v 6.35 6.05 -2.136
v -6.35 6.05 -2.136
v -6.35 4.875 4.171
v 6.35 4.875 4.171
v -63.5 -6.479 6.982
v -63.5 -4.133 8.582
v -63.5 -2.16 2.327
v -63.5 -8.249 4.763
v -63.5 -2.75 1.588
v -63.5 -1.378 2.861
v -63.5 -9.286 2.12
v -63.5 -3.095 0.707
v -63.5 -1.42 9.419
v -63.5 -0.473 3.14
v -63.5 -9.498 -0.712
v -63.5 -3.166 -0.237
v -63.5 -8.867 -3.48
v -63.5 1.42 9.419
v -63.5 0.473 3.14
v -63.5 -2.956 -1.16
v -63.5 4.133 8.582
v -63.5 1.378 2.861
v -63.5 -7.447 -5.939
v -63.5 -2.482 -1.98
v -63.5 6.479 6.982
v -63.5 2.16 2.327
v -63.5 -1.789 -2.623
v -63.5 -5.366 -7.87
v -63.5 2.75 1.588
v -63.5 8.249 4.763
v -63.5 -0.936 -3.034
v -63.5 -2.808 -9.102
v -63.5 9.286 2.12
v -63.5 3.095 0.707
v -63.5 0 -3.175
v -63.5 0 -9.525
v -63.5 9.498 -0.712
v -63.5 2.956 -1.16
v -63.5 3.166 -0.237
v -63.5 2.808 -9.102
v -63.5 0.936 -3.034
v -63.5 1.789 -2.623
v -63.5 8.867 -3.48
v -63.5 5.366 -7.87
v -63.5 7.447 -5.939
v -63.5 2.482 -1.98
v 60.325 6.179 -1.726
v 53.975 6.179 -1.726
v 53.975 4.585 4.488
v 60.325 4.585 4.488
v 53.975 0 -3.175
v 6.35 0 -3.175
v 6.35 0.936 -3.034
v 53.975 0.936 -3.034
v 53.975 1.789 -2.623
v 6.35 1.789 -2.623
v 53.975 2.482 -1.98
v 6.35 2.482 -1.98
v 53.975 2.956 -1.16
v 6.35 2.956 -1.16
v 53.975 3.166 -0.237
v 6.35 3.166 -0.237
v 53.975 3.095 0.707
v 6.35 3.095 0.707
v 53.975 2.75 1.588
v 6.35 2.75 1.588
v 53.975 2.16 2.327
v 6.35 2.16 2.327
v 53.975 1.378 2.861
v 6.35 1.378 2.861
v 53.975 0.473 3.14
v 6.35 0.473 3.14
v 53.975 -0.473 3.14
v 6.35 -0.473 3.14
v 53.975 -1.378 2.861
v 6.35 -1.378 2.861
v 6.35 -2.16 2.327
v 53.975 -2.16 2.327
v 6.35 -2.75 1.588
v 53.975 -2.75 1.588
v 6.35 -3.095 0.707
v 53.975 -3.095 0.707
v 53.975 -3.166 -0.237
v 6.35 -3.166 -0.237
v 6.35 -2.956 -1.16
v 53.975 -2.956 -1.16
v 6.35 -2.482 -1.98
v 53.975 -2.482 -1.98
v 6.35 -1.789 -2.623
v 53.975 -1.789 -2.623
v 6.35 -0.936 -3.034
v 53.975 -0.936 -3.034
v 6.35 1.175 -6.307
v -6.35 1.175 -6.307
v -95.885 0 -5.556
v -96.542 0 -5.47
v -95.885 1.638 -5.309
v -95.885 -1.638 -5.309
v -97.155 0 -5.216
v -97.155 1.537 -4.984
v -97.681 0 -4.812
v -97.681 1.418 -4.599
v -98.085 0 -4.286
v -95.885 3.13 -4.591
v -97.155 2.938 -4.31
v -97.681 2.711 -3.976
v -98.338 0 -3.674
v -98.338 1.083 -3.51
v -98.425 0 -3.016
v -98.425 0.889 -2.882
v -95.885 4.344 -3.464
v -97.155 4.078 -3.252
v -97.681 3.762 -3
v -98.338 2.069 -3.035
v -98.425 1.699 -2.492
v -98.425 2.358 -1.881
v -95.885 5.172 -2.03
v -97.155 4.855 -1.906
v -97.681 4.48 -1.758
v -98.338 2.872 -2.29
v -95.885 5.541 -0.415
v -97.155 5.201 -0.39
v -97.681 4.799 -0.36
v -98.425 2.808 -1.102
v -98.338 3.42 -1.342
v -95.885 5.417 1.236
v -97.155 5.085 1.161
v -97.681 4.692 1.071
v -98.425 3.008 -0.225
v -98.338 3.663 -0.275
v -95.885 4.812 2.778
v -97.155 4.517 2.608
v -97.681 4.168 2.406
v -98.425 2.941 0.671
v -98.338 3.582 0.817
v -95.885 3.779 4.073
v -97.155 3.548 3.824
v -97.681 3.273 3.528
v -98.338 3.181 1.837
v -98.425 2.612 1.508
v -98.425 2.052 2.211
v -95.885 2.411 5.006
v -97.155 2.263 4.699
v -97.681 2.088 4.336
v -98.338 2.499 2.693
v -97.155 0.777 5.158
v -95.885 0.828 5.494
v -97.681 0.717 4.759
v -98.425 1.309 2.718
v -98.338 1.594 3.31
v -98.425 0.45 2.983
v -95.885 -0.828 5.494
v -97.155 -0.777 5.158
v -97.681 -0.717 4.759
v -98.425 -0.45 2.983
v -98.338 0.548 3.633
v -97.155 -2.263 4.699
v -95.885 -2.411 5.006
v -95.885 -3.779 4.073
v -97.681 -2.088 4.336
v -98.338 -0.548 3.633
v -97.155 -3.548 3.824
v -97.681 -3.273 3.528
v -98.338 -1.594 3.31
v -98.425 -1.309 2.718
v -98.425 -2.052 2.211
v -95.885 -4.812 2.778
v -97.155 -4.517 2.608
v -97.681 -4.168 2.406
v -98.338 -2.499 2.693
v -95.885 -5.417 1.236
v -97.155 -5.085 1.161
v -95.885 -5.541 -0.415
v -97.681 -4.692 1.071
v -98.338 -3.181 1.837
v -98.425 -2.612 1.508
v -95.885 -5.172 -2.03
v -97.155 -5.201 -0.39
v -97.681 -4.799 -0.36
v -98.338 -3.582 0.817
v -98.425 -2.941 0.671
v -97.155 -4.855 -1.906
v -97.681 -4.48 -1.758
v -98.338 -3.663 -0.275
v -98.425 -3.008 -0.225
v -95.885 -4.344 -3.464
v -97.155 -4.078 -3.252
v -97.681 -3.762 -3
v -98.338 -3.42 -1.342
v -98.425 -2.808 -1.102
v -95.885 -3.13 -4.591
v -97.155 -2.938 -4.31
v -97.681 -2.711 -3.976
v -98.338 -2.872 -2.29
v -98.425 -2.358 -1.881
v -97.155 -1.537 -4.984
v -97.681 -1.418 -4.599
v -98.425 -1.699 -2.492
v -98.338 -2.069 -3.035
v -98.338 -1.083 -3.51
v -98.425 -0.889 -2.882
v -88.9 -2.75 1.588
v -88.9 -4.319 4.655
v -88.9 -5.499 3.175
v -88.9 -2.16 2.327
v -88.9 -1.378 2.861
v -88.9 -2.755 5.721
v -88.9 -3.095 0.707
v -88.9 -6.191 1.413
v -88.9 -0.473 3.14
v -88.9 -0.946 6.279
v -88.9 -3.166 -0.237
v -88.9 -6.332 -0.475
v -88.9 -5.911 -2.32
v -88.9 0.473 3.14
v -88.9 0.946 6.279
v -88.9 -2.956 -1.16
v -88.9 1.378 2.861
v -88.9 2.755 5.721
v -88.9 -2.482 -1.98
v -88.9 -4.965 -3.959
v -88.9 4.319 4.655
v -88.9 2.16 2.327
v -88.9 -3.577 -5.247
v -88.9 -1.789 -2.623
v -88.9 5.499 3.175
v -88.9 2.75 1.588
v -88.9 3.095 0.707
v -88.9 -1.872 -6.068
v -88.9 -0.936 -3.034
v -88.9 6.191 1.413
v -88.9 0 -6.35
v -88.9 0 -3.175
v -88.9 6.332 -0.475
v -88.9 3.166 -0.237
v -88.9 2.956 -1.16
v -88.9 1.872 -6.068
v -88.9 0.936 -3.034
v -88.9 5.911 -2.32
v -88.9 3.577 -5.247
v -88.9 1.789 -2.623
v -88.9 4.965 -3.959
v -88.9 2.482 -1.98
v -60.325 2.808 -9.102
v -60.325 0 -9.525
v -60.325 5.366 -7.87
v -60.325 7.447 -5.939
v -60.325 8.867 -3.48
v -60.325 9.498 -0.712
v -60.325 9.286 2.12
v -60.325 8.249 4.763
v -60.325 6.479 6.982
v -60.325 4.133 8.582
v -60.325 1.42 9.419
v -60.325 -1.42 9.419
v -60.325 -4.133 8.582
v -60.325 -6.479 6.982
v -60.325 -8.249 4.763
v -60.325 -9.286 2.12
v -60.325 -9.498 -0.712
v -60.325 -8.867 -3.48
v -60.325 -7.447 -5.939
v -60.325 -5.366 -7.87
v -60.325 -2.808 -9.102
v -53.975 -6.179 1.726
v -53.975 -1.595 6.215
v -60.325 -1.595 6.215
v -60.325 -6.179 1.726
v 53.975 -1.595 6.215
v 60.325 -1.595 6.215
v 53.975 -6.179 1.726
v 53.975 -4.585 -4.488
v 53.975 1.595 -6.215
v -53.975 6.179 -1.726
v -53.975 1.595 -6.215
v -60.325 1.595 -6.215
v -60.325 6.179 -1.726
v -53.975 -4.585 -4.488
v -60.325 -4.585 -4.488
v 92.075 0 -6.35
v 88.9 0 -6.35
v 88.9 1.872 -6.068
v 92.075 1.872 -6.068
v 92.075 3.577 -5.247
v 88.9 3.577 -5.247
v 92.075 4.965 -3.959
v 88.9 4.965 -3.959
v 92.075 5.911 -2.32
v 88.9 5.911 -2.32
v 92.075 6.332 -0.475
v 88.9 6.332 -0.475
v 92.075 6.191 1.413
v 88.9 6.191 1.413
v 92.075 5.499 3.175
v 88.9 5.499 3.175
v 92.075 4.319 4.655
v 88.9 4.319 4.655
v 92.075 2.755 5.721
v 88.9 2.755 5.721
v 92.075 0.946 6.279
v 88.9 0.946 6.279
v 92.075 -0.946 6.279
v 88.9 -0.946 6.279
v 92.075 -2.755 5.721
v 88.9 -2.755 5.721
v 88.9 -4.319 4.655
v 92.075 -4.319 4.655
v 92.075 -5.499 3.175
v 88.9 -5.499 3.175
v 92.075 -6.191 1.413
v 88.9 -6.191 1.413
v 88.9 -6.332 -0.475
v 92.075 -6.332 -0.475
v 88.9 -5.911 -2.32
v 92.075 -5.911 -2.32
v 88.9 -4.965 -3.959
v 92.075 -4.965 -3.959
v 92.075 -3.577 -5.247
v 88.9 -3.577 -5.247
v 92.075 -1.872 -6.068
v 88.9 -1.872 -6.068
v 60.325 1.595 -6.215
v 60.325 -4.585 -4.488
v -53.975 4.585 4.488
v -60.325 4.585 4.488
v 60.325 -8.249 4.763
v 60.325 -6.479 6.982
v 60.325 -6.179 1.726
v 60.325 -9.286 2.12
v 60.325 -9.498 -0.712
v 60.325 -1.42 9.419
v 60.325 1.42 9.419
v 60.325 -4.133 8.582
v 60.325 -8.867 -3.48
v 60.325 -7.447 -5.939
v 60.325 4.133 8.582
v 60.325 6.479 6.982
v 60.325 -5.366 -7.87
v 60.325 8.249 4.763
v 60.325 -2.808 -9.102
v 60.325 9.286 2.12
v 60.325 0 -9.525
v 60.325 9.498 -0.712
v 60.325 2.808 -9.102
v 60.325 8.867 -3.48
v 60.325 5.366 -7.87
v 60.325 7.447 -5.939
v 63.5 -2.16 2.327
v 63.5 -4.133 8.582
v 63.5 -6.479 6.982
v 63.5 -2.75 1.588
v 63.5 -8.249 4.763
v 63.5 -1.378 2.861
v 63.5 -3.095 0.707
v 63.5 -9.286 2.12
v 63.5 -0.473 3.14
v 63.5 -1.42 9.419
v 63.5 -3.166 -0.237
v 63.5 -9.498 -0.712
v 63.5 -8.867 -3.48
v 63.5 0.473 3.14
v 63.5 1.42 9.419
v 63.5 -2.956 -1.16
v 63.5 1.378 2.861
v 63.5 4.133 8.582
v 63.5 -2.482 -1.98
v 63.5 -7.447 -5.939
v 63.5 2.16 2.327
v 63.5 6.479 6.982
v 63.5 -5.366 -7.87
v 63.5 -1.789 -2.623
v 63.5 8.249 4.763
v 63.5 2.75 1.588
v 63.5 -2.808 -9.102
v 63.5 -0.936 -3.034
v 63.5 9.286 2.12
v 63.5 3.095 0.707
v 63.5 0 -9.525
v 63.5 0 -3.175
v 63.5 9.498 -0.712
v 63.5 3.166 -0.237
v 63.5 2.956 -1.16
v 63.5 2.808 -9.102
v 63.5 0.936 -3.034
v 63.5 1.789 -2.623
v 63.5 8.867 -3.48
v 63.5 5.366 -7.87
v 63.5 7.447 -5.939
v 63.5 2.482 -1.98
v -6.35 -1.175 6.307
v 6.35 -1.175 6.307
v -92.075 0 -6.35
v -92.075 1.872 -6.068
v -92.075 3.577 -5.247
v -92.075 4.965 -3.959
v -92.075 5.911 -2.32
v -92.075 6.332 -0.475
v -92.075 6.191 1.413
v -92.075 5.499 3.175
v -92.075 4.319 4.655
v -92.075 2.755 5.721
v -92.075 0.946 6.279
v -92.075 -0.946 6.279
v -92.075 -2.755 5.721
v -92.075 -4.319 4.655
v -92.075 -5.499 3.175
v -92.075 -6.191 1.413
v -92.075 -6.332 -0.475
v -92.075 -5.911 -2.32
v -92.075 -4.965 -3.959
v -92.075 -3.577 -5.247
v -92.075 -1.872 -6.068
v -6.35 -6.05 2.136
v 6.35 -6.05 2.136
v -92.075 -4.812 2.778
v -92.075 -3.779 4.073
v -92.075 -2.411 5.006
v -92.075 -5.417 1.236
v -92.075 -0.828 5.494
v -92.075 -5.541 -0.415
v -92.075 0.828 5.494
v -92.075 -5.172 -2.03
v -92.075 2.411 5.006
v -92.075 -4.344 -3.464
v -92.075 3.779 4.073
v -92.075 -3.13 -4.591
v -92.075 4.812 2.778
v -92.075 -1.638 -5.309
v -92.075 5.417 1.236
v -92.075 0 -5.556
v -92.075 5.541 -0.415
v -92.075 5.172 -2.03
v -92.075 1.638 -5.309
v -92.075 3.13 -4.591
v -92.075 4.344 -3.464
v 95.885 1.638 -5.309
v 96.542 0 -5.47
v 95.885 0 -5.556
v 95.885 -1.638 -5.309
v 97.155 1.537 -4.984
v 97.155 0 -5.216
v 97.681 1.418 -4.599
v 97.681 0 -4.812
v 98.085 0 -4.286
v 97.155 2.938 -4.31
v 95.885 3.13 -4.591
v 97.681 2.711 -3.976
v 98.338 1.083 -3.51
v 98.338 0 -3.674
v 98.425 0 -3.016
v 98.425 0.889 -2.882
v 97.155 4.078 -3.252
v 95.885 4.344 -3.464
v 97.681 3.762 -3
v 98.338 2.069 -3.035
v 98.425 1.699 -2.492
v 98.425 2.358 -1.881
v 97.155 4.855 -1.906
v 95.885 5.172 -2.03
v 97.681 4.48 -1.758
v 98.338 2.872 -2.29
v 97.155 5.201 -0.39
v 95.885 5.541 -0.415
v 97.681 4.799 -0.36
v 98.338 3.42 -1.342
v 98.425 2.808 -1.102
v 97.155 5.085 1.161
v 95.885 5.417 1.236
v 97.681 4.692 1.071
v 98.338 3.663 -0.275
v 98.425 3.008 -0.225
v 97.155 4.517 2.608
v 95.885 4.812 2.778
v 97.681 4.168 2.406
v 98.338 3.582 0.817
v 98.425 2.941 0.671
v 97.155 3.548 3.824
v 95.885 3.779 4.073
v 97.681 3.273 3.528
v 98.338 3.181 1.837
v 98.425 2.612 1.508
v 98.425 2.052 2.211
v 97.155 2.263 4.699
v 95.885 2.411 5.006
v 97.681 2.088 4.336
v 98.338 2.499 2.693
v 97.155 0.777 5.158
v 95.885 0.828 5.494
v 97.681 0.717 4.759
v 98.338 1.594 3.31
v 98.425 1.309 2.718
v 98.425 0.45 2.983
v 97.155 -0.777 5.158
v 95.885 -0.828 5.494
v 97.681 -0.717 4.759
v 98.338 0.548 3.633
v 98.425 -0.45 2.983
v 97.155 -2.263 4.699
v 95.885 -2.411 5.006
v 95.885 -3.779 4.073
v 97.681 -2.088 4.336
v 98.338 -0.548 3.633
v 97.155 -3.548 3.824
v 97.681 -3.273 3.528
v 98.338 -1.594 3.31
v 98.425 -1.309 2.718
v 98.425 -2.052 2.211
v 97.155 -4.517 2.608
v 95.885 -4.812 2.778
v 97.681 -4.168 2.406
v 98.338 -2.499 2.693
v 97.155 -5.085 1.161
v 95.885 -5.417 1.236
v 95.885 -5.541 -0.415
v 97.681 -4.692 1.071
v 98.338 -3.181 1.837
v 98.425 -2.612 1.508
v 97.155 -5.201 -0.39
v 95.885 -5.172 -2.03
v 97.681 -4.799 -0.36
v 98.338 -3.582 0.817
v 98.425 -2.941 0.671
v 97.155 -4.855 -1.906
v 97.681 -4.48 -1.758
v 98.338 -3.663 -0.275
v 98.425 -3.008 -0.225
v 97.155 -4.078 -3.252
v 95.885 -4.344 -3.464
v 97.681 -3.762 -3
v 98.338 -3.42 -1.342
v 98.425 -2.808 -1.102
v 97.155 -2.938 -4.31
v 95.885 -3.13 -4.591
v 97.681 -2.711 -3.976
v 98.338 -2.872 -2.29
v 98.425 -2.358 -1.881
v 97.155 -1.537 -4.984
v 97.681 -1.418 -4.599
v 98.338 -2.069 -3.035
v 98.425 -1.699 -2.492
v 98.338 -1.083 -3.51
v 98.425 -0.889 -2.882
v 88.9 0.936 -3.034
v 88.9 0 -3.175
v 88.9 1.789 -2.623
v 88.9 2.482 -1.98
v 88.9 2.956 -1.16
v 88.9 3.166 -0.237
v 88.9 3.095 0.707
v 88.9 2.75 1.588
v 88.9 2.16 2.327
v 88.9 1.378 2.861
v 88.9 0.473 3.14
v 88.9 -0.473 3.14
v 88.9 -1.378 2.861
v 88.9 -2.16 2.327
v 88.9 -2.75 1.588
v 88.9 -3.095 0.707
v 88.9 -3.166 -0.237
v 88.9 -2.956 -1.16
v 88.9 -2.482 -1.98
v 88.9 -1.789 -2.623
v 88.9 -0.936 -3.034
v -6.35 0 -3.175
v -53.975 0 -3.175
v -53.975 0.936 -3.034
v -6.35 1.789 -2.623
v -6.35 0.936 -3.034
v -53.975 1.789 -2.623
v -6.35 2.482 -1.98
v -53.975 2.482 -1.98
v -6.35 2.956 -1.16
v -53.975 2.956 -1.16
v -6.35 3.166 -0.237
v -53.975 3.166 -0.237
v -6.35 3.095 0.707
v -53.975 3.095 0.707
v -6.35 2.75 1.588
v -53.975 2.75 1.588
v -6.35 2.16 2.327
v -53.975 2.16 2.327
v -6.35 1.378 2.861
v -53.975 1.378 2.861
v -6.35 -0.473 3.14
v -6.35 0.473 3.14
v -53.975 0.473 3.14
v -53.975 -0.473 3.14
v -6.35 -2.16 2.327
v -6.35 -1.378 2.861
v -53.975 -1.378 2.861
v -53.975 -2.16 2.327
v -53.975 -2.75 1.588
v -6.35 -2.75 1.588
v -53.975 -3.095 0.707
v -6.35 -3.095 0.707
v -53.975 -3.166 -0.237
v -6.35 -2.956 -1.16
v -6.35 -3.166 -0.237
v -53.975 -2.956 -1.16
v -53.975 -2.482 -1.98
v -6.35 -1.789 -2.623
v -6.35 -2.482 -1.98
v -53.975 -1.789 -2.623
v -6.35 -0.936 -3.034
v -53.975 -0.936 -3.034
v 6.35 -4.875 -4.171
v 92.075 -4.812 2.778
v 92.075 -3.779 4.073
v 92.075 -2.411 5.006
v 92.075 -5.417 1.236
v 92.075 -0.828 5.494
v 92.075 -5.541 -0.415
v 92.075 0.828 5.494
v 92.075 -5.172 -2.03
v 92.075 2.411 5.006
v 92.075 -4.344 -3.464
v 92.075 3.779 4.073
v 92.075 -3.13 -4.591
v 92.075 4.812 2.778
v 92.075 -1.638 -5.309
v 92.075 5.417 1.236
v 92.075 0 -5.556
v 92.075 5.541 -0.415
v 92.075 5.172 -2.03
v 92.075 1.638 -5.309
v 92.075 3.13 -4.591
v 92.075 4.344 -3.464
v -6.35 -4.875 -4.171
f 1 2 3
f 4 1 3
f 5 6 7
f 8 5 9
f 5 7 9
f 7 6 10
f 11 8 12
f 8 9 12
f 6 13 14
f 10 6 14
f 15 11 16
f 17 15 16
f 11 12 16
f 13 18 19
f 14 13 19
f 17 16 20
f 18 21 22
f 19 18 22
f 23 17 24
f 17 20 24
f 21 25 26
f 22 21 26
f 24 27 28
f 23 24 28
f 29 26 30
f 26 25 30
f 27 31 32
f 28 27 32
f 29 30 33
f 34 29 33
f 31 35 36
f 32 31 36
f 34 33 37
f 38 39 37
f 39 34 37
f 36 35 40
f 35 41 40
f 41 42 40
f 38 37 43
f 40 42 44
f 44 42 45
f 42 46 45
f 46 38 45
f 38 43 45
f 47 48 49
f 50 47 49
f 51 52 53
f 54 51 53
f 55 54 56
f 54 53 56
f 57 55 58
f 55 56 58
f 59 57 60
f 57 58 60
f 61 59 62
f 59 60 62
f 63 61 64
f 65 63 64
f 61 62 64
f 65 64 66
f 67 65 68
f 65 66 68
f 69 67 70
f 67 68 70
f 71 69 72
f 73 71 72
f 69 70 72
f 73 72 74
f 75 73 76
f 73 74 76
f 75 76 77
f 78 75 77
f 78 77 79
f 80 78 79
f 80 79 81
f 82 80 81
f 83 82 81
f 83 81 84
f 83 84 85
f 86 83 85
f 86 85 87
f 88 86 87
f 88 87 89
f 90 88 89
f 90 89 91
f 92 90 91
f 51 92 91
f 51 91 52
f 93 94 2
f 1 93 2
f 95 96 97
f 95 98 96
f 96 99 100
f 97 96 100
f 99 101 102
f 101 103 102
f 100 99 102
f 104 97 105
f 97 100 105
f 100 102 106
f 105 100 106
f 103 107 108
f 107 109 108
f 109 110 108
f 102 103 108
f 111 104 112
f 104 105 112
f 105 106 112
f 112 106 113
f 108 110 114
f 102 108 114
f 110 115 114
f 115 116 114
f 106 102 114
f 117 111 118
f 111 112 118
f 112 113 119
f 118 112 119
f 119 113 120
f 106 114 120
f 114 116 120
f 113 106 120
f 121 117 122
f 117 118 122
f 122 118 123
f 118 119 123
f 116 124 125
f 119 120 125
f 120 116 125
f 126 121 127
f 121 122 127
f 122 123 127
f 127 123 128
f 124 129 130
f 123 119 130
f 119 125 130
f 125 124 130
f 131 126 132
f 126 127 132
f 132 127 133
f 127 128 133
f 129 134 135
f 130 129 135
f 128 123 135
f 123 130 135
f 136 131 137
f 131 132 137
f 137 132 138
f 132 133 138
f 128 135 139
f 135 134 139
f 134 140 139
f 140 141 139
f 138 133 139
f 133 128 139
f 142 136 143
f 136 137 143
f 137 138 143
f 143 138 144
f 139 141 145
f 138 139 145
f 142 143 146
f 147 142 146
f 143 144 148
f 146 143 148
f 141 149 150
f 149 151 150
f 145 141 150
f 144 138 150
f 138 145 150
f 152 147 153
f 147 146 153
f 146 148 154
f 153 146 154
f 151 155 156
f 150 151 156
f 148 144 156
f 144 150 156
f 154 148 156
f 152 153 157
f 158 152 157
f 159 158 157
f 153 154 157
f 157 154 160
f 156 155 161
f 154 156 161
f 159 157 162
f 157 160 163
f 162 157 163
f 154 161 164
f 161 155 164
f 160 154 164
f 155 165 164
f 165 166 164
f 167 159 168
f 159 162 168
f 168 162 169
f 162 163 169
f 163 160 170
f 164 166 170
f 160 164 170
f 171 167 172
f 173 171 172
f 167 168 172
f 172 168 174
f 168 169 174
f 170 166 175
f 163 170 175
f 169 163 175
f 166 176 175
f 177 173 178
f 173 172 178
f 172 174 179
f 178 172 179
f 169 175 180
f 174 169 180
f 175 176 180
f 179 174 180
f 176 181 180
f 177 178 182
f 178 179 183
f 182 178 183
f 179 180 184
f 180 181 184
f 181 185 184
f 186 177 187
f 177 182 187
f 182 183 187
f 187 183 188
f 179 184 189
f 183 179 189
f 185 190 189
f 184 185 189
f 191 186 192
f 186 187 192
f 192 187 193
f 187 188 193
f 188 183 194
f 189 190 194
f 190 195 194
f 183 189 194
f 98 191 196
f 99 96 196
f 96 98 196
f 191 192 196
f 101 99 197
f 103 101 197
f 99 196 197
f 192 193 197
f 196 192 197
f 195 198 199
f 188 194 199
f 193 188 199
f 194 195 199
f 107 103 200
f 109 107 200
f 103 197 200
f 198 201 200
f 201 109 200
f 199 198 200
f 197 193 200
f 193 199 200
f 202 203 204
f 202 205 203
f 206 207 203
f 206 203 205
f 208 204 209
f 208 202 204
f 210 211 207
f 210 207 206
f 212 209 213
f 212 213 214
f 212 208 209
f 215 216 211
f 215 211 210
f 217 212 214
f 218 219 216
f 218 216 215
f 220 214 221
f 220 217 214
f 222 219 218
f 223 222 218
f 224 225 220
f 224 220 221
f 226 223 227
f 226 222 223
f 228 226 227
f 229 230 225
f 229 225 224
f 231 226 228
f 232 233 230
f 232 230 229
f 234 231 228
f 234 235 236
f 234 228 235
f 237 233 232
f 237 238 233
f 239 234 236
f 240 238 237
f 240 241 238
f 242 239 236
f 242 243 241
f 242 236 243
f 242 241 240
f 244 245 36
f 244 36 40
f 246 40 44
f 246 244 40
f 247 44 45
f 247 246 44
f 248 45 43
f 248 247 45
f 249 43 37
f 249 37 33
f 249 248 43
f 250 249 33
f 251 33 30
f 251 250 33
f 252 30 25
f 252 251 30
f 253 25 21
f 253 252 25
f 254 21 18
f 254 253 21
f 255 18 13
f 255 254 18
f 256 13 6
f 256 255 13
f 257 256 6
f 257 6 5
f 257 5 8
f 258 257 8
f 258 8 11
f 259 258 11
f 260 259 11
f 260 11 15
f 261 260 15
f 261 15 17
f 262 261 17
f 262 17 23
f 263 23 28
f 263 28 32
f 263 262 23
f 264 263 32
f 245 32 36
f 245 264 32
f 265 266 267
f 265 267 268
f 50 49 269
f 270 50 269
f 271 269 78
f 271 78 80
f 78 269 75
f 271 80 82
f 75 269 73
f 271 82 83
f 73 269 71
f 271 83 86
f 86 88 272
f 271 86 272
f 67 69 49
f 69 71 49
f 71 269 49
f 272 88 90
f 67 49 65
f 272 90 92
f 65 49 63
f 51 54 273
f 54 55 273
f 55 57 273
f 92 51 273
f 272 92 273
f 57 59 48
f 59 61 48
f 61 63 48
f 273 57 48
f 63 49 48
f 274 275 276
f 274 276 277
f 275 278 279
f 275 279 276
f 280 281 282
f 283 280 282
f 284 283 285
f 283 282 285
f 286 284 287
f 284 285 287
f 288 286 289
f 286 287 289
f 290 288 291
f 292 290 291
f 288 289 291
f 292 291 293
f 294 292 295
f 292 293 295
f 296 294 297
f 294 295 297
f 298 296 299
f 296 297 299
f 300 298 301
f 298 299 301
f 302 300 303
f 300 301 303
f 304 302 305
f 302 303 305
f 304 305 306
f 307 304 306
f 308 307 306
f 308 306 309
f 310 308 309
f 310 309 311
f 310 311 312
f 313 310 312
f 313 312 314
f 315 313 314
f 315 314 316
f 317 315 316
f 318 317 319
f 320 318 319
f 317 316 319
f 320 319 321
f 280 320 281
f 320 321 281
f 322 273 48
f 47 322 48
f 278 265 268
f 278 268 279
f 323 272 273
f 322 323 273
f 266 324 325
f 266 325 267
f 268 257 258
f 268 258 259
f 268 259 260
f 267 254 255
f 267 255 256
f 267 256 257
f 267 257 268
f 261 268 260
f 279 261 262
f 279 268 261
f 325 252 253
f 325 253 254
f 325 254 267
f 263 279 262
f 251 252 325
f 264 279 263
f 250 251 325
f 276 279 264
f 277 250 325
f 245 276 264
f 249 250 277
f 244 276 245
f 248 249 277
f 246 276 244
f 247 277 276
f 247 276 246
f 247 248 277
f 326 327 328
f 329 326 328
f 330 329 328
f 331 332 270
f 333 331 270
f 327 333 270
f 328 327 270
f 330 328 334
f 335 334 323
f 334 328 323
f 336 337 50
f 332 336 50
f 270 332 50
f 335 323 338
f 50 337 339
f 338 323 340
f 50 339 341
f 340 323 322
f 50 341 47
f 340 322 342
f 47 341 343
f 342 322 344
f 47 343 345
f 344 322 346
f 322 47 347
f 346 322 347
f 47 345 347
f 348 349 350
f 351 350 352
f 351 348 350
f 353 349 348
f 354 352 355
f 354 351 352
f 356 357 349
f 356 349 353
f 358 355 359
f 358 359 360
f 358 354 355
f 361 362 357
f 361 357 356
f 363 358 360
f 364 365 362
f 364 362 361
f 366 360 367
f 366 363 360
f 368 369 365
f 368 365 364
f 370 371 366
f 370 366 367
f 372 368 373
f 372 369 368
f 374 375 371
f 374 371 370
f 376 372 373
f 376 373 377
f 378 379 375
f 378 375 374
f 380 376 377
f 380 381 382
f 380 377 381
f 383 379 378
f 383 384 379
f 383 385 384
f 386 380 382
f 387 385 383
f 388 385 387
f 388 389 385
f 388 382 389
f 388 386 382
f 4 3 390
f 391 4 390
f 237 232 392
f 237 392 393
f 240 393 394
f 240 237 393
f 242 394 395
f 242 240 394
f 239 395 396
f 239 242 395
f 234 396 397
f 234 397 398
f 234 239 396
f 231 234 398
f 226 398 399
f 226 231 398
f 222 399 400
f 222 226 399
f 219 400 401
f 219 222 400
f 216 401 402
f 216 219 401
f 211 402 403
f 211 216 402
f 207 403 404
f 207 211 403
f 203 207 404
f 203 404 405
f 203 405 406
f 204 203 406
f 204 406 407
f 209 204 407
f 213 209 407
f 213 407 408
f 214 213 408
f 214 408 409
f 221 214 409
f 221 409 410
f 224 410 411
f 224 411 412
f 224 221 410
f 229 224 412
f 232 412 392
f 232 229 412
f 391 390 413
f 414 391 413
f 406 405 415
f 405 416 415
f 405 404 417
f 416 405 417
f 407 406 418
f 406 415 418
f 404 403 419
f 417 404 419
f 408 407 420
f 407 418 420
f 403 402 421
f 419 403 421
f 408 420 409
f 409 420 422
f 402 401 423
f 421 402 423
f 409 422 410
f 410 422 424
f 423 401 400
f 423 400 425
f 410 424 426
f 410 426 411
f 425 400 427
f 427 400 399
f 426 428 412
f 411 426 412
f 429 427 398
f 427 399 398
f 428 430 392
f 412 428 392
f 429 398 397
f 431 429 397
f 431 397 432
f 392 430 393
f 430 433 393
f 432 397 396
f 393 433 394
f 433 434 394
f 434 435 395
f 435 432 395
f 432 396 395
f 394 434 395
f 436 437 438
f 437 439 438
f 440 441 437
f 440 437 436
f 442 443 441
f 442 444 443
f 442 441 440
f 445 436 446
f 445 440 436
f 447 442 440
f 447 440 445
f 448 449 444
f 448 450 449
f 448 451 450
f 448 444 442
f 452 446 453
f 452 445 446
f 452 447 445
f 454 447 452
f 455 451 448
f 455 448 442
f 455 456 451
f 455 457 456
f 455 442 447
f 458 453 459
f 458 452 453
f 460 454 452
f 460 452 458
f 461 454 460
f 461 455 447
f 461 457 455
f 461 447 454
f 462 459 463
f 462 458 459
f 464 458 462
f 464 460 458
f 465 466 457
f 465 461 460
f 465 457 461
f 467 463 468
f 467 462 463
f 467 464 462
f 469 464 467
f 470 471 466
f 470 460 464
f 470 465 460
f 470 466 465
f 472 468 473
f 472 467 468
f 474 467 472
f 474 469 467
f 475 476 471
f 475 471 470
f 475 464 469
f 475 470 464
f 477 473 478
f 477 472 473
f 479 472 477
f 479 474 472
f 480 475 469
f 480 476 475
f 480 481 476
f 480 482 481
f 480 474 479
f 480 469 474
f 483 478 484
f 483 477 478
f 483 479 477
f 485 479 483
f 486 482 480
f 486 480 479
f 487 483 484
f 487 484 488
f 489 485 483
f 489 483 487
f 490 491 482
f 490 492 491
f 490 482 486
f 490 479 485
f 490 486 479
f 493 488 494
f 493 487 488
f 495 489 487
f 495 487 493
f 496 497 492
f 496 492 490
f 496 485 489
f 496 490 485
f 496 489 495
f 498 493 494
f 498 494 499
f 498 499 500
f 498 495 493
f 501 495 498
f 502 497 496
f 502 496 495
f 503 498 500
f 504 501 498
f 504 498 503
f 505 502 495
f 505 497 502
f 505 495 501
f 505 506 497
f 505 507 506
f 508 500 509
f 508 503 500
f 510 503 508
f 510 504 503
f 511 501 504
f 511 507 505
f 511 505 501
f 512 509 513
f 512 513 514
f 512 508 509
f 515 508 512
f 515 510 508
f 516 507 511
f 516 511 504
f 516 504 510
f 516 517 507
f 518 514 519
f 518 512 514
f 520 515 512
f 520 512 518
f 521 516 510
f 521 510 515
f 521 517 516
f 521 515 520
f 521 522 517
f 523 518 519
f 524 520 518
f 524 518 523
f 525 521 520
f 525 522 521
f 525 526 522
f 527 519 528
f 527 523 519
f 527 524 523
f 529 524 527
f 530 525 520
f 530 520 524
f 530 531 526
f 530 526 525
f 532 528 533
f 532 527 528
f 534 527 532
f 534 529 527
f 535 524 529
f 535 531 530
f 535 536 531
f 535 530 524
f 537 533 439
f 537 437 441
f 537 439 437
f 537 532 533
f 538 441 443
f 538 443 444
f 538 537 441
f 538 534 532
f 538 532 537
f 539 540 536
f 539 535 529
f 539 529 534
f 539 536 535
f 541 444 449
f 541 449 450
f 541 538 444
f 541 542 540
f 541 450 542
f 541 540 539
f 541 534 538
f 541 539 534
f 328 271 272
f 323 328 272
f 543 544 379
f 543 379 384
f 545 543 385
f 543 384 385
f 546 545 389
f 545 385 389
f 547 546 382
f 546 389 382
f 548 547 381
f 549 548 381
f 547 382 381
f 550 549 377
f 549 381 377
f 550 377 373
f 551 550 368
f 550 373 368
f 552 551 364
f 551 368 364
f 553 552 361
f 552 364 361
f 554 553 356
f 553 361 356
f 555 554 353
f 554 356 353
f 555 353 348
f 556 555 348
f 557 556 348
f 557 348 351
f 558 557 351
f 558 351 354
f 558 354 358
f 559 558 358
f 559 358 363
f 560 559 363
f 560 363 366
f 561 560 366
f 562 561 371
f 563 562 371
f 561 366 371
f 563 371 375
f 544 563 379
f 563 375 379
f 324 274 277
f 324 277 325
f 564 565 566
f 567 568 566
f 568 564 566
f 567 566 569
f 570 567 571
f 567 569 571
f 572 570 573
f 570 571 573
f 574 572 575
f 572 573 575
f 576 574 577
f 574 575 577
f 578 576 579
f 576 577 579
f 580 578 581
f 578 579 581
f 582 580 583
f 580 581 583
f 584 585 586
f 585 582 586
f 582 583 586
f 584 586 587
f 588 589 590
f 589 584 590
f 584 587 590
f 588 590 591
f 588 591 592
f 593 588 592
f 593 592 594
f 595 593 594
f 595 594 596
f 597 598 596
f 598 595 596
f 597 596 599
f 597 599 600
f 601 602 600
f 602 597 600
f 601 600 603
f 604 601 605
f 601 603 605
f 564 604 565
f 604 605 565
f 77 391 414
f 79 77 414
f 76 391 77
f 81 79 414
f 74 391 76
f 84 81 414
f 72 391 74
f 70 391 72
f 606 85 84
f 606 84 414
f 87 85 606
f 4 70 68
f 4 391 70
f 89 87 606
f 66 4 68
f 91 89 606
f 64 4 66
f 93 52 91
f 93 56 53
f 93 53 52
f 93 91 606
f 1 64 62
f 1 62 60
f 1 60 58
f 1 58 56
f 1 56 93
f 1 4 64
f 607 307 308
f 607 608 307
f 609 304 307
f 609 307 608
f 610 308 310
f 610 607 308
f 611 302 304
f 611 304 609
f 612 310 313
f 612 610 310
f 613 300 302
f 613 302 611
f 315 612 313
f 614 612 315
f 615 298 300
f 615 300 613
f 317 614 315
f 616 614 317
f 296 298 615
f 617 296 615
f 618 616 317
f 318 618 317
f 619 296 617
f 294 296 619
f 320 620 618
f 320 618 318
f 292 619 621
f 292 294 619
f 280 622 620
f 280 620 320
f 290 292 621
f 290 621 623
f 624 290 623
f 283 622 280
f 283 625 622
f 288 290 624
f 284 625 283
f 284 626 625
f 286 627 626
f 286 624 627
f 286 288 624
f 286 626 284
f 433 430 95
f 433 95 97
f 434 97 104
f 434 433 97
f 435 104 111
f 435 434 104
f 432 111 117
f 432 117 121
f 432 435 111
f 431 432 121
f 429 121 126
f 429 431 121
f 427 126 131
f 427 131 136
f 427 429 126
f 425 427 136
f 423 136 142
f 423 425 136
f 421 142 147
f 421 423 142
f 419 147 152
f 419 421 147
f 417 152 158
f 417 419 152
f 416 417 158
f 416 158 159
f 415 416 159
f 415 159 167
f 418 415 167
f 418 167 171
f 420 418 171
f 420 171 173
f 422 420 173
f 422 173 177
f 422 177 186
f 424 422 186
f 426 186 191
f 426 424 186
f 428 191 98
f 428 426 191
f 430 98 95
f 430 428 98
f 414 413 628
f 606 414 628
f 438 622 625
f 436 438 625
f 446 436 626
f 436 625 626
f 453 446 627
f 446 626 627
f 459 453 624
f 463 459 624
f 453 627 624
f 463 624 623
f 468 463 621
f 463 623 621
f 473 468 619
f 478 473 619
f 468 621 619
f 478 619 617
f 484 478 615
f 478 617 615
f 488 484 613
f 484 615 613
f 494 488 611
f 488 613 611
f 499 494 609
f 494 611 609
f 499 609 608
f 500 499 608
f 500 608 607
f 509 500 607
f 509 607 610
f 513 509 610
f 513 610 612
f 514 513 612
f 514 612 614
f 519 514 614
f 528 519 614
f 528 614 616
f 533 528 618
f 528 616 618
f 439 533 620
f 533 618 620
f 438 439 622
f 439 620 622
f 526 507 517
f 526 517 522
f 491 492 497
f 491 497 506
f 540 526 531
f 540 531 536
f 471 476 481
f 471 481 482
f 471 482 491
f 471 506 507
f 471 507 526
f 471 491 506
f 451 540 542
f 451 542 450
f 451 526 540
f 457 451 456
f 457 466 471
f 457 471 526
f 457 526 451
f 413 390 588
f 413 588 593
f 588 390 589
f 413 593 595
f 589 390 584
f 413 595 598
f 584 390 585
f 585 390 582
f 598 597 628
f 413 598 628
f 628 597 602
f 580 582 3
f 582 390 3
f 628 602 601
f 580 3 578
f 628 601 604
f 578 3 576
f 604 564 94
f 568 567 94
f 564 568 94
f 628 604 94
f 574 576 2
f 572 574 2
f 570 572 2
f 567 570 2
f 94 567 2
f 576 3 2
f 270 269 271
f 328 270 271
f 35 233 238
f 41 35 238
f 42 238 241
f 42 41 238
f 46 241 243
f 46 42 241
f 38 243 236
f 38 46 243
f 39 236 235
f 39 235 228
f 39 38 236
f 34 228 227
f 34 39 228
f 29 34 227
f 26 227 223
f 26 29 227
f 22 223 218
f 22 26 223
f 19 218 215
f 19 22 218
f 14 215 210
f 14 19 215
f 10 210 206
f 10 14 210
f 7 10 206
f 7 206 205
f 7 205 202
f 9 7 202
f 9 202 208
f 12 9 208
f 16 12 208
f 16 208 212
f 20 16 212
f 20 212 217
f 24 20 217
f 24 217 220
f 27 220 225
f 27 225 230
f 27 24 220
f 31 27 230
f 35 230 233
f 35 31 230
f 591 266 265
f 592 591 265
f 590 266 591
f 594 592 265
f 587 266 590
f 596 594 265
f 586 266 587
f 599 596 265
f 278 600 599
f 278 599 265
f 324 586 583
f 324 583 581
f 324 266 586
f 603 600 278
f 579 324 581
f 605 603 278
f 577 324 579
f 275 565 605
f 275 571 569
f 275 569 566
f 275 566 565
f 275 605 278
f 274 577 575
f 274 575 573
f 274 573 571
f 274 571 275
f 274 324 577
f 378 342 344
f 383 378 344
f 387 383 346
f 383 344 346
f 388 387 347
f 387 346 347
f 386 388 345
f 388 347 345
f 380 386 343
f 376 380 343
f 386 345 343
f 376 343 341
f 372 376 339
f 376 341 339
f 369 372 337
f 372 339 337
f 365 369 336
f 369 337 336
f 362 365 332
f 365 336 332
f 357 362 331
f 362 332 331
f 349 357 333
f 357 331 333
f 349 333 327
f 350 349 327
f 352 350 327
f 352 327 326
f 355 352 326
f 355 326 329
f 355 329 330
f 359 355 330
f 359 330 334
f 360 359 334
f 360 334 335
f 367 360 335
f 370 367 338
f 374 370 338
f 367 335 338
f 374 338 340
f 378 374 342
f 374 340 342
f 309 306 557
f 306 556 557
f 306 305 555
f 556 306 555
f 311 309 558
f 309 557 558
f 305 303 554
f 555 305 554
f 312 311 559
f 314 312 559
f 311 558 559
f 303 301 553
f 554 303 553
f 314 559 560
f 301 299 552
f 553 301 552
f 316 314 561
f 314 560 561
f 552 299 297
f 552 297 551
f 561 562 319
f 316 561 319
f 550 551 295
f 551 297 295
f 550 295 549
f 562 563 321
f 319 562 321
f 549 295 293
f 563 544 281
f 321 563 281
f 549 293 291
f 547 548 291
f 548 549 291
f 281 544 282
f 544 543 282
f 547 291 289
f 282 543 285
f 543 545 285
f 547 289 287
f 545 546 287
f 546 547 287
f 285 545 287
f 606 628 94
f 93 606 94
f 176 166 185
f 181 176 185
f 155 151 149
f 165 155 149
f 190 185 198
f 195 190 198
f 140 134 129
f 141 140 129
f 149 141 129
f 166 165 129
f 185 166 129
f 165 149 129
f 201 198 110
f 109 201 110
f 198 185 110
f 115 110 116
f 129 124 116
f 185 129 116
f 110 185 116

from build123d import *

# Parameters (mm, degrees)
BOSS_EXTRUDE1_DEPTH      = 6.35
BOSS_EXTRUDE1_DEPTH_BACK = 6.35
BOSS_EXTRUDE2_DEPTH      = 47.625
BOSS_EXTRUDE2_DEPTH_BACK = 66.675
SKETCH3_R                = 3.175
BOSS_EXTRUDE3_DEPTH      = 6.35
SKETCH5_R                = 9.525
BOSS_EXTRUDE4_DEPTH      = 3.175
SKETCH7_R                = 3.175
BOSS_EXTRUDE5_DEPTH      = 25.4
SKETCH8_R                = 6.35
BOSS_EXTRUDE6_DEPTH      = 3.175
SKETCH9_R                = 5.55625
BOSS_EXTRUDE7_DEPTH      = 6.35
FILLET1_R                = 2.54
FILLET1_OF_MIRROR2_R     = 2.54


with BuildPart() as part:
    # Sketch2 → Boss-Extrude1 (new, two sides: drawn at the far end of the back side and taken through both)
    with BuildSketch(Plane(origin=(0, 0, 0), x_dir=(0, 0, -1), z_dir=(1, 0, 0)).offset(-BOSS_EXTRUDE1_DEPTH_BACK)):
        Polygon((4.171210262, -4.874787896), (6.307295287, 1.174980103), (2.136085025, 6.049767999), (-4.171210262, 4.874787896), (-6.307295287, -1.174980103), (-2.136085025, -6.049767999), align=None)
    extrude(amount=BOSS_EXTRUDE1_DEPTH + BOSS_EXTRUDE1_DEPTH_BACK)

    # Sketch3 → Boss-Extrude2 (add, two sides: drawn at the far end of the back side and taken through both)
    with BuildSketch(Plane(origin=(6.35, 0, 0), x_dir=(0, 0, -1), z_dir=(1, 0, 0)).offset(-BOSS_EXTRUDE2_DEPTH_BACK)):
        Circle(SKETCH3_R)
    extrude(amount=BOSS_EXTRUDE2_DEPTH + BOSS_EXTRUDE2_DEPTH_BACK)

    # Sketch4 → Boss-Extrude3 (add)
    with BuildSketch(Plane(origin=(53.975, 0, 0), x_dir=(0, 0, -1), z_dir=(1, 0, 0))):
        Polygon((4.488142835, -4.584662035), (6.214505208, 1.594514693), (1.726362373, 6.179176728), (-4.488142835, 4.584662035), (-6.214505208, -1.594514693), (-1.726362373, -6.179176728), align=None)
    boss_extrude3 = extrude(amount=BOSS_EXTRUDE3_DEPTH)

    # Sketch5 → Boss-Extrude4 (add)
    with BuildSketch(Plane(origin=(60.325, 0, 0), x_dir=(0, 0, -1), z_dir=(1, 0, 0))):
        Circle(SKETCH5_R)
    boss_extrude4 = extrude(amount=BOSS_EXTRUDE4_DEPTH)

    # Mirror1: Boss-Extrude3, Boss-Extrude4 across plane
    add(boss_extrude3.mirror(Plane(origin=(0, 0, 0), x_dir=(0, 0, 1), z_dir=(1, 0, 0))))
    add(boss_extrude4.mirror(Plane(origin=(0, 0, 0), x_dir=(0, 0, 1), z_dir=(1, 0, 0))))

    # Sketch7 → Boss-Extrude5 (add)
    with BuildSketch(Plane(origin=(63.5, 0, 0), x_dir=(0, 0, -1), z_dir=(1, 0, 0))):
        Circle(SKETCH7_R)
    boss_extrude5 = extrude(amount=BOSS_EXTRUDE5_DEPTH)

    # Sketch8 → Boss-Extrude6 (add)
    with BuildSketch(Plane(origin=(88.9, 0, 0), x_dir=(0, 0, -1), z_dir=(1, 0, 0))):
        Circle(SKETCH8_R)
    boss_extrude6 = extrude(amount=BOSS_EXTRUDE6_DEPTH)

    # Sketch9 → Boss-Extrude7 (add)
    with BuildSketch(Plane(origin=(92.075, 0, 0), x_dir=(0, 0, -1), z_dir=(1, 0, 0))):
        Circle(SKETCH9_R)
    boss_extrude7 = extrude(amount=BOSS_EXTRUDE7_DEPTH)

    # Fillet1
    fillet1_edges = [part.edges().sort_by_distance(p)[0] for p in [
        (98.425, 0, 5.55625),
    ]]
    fillet(fillet1_edges, radius=FILLET1_R)

    # Mirror2: Boss-Extrude5, Boss-Extrude6, Boss-Extrude7 across plane
    add(boss_extrude5.mirror(Plane(origin=(0, 0, 0), x_dir=(0, 0, 1), z_dir=(1, 0, 0))))
    add(boss_extrude6.mirror(Plane(origin=(0, 0, 0), x_dir=(0, 0, 1), z_dir=(1, 0, 0))))
    add(boss_extrude7.mirror(Plane(origin=(0, 0, 0), x_dir=(0, 0, 1), z_dir=(1, 0, 0))))

    # Fillet1 of Mirror2
    fillet1_of_mirror2_edges = [part.edges().sort_by_distance(p)[0] for p in [
        (-98.425, 0, 5.55625),
    ]]
    fillet(fillet1_of_mirror2_edges, radius=FILLET1_OF_MIRROR2_R)


solid = part.part
